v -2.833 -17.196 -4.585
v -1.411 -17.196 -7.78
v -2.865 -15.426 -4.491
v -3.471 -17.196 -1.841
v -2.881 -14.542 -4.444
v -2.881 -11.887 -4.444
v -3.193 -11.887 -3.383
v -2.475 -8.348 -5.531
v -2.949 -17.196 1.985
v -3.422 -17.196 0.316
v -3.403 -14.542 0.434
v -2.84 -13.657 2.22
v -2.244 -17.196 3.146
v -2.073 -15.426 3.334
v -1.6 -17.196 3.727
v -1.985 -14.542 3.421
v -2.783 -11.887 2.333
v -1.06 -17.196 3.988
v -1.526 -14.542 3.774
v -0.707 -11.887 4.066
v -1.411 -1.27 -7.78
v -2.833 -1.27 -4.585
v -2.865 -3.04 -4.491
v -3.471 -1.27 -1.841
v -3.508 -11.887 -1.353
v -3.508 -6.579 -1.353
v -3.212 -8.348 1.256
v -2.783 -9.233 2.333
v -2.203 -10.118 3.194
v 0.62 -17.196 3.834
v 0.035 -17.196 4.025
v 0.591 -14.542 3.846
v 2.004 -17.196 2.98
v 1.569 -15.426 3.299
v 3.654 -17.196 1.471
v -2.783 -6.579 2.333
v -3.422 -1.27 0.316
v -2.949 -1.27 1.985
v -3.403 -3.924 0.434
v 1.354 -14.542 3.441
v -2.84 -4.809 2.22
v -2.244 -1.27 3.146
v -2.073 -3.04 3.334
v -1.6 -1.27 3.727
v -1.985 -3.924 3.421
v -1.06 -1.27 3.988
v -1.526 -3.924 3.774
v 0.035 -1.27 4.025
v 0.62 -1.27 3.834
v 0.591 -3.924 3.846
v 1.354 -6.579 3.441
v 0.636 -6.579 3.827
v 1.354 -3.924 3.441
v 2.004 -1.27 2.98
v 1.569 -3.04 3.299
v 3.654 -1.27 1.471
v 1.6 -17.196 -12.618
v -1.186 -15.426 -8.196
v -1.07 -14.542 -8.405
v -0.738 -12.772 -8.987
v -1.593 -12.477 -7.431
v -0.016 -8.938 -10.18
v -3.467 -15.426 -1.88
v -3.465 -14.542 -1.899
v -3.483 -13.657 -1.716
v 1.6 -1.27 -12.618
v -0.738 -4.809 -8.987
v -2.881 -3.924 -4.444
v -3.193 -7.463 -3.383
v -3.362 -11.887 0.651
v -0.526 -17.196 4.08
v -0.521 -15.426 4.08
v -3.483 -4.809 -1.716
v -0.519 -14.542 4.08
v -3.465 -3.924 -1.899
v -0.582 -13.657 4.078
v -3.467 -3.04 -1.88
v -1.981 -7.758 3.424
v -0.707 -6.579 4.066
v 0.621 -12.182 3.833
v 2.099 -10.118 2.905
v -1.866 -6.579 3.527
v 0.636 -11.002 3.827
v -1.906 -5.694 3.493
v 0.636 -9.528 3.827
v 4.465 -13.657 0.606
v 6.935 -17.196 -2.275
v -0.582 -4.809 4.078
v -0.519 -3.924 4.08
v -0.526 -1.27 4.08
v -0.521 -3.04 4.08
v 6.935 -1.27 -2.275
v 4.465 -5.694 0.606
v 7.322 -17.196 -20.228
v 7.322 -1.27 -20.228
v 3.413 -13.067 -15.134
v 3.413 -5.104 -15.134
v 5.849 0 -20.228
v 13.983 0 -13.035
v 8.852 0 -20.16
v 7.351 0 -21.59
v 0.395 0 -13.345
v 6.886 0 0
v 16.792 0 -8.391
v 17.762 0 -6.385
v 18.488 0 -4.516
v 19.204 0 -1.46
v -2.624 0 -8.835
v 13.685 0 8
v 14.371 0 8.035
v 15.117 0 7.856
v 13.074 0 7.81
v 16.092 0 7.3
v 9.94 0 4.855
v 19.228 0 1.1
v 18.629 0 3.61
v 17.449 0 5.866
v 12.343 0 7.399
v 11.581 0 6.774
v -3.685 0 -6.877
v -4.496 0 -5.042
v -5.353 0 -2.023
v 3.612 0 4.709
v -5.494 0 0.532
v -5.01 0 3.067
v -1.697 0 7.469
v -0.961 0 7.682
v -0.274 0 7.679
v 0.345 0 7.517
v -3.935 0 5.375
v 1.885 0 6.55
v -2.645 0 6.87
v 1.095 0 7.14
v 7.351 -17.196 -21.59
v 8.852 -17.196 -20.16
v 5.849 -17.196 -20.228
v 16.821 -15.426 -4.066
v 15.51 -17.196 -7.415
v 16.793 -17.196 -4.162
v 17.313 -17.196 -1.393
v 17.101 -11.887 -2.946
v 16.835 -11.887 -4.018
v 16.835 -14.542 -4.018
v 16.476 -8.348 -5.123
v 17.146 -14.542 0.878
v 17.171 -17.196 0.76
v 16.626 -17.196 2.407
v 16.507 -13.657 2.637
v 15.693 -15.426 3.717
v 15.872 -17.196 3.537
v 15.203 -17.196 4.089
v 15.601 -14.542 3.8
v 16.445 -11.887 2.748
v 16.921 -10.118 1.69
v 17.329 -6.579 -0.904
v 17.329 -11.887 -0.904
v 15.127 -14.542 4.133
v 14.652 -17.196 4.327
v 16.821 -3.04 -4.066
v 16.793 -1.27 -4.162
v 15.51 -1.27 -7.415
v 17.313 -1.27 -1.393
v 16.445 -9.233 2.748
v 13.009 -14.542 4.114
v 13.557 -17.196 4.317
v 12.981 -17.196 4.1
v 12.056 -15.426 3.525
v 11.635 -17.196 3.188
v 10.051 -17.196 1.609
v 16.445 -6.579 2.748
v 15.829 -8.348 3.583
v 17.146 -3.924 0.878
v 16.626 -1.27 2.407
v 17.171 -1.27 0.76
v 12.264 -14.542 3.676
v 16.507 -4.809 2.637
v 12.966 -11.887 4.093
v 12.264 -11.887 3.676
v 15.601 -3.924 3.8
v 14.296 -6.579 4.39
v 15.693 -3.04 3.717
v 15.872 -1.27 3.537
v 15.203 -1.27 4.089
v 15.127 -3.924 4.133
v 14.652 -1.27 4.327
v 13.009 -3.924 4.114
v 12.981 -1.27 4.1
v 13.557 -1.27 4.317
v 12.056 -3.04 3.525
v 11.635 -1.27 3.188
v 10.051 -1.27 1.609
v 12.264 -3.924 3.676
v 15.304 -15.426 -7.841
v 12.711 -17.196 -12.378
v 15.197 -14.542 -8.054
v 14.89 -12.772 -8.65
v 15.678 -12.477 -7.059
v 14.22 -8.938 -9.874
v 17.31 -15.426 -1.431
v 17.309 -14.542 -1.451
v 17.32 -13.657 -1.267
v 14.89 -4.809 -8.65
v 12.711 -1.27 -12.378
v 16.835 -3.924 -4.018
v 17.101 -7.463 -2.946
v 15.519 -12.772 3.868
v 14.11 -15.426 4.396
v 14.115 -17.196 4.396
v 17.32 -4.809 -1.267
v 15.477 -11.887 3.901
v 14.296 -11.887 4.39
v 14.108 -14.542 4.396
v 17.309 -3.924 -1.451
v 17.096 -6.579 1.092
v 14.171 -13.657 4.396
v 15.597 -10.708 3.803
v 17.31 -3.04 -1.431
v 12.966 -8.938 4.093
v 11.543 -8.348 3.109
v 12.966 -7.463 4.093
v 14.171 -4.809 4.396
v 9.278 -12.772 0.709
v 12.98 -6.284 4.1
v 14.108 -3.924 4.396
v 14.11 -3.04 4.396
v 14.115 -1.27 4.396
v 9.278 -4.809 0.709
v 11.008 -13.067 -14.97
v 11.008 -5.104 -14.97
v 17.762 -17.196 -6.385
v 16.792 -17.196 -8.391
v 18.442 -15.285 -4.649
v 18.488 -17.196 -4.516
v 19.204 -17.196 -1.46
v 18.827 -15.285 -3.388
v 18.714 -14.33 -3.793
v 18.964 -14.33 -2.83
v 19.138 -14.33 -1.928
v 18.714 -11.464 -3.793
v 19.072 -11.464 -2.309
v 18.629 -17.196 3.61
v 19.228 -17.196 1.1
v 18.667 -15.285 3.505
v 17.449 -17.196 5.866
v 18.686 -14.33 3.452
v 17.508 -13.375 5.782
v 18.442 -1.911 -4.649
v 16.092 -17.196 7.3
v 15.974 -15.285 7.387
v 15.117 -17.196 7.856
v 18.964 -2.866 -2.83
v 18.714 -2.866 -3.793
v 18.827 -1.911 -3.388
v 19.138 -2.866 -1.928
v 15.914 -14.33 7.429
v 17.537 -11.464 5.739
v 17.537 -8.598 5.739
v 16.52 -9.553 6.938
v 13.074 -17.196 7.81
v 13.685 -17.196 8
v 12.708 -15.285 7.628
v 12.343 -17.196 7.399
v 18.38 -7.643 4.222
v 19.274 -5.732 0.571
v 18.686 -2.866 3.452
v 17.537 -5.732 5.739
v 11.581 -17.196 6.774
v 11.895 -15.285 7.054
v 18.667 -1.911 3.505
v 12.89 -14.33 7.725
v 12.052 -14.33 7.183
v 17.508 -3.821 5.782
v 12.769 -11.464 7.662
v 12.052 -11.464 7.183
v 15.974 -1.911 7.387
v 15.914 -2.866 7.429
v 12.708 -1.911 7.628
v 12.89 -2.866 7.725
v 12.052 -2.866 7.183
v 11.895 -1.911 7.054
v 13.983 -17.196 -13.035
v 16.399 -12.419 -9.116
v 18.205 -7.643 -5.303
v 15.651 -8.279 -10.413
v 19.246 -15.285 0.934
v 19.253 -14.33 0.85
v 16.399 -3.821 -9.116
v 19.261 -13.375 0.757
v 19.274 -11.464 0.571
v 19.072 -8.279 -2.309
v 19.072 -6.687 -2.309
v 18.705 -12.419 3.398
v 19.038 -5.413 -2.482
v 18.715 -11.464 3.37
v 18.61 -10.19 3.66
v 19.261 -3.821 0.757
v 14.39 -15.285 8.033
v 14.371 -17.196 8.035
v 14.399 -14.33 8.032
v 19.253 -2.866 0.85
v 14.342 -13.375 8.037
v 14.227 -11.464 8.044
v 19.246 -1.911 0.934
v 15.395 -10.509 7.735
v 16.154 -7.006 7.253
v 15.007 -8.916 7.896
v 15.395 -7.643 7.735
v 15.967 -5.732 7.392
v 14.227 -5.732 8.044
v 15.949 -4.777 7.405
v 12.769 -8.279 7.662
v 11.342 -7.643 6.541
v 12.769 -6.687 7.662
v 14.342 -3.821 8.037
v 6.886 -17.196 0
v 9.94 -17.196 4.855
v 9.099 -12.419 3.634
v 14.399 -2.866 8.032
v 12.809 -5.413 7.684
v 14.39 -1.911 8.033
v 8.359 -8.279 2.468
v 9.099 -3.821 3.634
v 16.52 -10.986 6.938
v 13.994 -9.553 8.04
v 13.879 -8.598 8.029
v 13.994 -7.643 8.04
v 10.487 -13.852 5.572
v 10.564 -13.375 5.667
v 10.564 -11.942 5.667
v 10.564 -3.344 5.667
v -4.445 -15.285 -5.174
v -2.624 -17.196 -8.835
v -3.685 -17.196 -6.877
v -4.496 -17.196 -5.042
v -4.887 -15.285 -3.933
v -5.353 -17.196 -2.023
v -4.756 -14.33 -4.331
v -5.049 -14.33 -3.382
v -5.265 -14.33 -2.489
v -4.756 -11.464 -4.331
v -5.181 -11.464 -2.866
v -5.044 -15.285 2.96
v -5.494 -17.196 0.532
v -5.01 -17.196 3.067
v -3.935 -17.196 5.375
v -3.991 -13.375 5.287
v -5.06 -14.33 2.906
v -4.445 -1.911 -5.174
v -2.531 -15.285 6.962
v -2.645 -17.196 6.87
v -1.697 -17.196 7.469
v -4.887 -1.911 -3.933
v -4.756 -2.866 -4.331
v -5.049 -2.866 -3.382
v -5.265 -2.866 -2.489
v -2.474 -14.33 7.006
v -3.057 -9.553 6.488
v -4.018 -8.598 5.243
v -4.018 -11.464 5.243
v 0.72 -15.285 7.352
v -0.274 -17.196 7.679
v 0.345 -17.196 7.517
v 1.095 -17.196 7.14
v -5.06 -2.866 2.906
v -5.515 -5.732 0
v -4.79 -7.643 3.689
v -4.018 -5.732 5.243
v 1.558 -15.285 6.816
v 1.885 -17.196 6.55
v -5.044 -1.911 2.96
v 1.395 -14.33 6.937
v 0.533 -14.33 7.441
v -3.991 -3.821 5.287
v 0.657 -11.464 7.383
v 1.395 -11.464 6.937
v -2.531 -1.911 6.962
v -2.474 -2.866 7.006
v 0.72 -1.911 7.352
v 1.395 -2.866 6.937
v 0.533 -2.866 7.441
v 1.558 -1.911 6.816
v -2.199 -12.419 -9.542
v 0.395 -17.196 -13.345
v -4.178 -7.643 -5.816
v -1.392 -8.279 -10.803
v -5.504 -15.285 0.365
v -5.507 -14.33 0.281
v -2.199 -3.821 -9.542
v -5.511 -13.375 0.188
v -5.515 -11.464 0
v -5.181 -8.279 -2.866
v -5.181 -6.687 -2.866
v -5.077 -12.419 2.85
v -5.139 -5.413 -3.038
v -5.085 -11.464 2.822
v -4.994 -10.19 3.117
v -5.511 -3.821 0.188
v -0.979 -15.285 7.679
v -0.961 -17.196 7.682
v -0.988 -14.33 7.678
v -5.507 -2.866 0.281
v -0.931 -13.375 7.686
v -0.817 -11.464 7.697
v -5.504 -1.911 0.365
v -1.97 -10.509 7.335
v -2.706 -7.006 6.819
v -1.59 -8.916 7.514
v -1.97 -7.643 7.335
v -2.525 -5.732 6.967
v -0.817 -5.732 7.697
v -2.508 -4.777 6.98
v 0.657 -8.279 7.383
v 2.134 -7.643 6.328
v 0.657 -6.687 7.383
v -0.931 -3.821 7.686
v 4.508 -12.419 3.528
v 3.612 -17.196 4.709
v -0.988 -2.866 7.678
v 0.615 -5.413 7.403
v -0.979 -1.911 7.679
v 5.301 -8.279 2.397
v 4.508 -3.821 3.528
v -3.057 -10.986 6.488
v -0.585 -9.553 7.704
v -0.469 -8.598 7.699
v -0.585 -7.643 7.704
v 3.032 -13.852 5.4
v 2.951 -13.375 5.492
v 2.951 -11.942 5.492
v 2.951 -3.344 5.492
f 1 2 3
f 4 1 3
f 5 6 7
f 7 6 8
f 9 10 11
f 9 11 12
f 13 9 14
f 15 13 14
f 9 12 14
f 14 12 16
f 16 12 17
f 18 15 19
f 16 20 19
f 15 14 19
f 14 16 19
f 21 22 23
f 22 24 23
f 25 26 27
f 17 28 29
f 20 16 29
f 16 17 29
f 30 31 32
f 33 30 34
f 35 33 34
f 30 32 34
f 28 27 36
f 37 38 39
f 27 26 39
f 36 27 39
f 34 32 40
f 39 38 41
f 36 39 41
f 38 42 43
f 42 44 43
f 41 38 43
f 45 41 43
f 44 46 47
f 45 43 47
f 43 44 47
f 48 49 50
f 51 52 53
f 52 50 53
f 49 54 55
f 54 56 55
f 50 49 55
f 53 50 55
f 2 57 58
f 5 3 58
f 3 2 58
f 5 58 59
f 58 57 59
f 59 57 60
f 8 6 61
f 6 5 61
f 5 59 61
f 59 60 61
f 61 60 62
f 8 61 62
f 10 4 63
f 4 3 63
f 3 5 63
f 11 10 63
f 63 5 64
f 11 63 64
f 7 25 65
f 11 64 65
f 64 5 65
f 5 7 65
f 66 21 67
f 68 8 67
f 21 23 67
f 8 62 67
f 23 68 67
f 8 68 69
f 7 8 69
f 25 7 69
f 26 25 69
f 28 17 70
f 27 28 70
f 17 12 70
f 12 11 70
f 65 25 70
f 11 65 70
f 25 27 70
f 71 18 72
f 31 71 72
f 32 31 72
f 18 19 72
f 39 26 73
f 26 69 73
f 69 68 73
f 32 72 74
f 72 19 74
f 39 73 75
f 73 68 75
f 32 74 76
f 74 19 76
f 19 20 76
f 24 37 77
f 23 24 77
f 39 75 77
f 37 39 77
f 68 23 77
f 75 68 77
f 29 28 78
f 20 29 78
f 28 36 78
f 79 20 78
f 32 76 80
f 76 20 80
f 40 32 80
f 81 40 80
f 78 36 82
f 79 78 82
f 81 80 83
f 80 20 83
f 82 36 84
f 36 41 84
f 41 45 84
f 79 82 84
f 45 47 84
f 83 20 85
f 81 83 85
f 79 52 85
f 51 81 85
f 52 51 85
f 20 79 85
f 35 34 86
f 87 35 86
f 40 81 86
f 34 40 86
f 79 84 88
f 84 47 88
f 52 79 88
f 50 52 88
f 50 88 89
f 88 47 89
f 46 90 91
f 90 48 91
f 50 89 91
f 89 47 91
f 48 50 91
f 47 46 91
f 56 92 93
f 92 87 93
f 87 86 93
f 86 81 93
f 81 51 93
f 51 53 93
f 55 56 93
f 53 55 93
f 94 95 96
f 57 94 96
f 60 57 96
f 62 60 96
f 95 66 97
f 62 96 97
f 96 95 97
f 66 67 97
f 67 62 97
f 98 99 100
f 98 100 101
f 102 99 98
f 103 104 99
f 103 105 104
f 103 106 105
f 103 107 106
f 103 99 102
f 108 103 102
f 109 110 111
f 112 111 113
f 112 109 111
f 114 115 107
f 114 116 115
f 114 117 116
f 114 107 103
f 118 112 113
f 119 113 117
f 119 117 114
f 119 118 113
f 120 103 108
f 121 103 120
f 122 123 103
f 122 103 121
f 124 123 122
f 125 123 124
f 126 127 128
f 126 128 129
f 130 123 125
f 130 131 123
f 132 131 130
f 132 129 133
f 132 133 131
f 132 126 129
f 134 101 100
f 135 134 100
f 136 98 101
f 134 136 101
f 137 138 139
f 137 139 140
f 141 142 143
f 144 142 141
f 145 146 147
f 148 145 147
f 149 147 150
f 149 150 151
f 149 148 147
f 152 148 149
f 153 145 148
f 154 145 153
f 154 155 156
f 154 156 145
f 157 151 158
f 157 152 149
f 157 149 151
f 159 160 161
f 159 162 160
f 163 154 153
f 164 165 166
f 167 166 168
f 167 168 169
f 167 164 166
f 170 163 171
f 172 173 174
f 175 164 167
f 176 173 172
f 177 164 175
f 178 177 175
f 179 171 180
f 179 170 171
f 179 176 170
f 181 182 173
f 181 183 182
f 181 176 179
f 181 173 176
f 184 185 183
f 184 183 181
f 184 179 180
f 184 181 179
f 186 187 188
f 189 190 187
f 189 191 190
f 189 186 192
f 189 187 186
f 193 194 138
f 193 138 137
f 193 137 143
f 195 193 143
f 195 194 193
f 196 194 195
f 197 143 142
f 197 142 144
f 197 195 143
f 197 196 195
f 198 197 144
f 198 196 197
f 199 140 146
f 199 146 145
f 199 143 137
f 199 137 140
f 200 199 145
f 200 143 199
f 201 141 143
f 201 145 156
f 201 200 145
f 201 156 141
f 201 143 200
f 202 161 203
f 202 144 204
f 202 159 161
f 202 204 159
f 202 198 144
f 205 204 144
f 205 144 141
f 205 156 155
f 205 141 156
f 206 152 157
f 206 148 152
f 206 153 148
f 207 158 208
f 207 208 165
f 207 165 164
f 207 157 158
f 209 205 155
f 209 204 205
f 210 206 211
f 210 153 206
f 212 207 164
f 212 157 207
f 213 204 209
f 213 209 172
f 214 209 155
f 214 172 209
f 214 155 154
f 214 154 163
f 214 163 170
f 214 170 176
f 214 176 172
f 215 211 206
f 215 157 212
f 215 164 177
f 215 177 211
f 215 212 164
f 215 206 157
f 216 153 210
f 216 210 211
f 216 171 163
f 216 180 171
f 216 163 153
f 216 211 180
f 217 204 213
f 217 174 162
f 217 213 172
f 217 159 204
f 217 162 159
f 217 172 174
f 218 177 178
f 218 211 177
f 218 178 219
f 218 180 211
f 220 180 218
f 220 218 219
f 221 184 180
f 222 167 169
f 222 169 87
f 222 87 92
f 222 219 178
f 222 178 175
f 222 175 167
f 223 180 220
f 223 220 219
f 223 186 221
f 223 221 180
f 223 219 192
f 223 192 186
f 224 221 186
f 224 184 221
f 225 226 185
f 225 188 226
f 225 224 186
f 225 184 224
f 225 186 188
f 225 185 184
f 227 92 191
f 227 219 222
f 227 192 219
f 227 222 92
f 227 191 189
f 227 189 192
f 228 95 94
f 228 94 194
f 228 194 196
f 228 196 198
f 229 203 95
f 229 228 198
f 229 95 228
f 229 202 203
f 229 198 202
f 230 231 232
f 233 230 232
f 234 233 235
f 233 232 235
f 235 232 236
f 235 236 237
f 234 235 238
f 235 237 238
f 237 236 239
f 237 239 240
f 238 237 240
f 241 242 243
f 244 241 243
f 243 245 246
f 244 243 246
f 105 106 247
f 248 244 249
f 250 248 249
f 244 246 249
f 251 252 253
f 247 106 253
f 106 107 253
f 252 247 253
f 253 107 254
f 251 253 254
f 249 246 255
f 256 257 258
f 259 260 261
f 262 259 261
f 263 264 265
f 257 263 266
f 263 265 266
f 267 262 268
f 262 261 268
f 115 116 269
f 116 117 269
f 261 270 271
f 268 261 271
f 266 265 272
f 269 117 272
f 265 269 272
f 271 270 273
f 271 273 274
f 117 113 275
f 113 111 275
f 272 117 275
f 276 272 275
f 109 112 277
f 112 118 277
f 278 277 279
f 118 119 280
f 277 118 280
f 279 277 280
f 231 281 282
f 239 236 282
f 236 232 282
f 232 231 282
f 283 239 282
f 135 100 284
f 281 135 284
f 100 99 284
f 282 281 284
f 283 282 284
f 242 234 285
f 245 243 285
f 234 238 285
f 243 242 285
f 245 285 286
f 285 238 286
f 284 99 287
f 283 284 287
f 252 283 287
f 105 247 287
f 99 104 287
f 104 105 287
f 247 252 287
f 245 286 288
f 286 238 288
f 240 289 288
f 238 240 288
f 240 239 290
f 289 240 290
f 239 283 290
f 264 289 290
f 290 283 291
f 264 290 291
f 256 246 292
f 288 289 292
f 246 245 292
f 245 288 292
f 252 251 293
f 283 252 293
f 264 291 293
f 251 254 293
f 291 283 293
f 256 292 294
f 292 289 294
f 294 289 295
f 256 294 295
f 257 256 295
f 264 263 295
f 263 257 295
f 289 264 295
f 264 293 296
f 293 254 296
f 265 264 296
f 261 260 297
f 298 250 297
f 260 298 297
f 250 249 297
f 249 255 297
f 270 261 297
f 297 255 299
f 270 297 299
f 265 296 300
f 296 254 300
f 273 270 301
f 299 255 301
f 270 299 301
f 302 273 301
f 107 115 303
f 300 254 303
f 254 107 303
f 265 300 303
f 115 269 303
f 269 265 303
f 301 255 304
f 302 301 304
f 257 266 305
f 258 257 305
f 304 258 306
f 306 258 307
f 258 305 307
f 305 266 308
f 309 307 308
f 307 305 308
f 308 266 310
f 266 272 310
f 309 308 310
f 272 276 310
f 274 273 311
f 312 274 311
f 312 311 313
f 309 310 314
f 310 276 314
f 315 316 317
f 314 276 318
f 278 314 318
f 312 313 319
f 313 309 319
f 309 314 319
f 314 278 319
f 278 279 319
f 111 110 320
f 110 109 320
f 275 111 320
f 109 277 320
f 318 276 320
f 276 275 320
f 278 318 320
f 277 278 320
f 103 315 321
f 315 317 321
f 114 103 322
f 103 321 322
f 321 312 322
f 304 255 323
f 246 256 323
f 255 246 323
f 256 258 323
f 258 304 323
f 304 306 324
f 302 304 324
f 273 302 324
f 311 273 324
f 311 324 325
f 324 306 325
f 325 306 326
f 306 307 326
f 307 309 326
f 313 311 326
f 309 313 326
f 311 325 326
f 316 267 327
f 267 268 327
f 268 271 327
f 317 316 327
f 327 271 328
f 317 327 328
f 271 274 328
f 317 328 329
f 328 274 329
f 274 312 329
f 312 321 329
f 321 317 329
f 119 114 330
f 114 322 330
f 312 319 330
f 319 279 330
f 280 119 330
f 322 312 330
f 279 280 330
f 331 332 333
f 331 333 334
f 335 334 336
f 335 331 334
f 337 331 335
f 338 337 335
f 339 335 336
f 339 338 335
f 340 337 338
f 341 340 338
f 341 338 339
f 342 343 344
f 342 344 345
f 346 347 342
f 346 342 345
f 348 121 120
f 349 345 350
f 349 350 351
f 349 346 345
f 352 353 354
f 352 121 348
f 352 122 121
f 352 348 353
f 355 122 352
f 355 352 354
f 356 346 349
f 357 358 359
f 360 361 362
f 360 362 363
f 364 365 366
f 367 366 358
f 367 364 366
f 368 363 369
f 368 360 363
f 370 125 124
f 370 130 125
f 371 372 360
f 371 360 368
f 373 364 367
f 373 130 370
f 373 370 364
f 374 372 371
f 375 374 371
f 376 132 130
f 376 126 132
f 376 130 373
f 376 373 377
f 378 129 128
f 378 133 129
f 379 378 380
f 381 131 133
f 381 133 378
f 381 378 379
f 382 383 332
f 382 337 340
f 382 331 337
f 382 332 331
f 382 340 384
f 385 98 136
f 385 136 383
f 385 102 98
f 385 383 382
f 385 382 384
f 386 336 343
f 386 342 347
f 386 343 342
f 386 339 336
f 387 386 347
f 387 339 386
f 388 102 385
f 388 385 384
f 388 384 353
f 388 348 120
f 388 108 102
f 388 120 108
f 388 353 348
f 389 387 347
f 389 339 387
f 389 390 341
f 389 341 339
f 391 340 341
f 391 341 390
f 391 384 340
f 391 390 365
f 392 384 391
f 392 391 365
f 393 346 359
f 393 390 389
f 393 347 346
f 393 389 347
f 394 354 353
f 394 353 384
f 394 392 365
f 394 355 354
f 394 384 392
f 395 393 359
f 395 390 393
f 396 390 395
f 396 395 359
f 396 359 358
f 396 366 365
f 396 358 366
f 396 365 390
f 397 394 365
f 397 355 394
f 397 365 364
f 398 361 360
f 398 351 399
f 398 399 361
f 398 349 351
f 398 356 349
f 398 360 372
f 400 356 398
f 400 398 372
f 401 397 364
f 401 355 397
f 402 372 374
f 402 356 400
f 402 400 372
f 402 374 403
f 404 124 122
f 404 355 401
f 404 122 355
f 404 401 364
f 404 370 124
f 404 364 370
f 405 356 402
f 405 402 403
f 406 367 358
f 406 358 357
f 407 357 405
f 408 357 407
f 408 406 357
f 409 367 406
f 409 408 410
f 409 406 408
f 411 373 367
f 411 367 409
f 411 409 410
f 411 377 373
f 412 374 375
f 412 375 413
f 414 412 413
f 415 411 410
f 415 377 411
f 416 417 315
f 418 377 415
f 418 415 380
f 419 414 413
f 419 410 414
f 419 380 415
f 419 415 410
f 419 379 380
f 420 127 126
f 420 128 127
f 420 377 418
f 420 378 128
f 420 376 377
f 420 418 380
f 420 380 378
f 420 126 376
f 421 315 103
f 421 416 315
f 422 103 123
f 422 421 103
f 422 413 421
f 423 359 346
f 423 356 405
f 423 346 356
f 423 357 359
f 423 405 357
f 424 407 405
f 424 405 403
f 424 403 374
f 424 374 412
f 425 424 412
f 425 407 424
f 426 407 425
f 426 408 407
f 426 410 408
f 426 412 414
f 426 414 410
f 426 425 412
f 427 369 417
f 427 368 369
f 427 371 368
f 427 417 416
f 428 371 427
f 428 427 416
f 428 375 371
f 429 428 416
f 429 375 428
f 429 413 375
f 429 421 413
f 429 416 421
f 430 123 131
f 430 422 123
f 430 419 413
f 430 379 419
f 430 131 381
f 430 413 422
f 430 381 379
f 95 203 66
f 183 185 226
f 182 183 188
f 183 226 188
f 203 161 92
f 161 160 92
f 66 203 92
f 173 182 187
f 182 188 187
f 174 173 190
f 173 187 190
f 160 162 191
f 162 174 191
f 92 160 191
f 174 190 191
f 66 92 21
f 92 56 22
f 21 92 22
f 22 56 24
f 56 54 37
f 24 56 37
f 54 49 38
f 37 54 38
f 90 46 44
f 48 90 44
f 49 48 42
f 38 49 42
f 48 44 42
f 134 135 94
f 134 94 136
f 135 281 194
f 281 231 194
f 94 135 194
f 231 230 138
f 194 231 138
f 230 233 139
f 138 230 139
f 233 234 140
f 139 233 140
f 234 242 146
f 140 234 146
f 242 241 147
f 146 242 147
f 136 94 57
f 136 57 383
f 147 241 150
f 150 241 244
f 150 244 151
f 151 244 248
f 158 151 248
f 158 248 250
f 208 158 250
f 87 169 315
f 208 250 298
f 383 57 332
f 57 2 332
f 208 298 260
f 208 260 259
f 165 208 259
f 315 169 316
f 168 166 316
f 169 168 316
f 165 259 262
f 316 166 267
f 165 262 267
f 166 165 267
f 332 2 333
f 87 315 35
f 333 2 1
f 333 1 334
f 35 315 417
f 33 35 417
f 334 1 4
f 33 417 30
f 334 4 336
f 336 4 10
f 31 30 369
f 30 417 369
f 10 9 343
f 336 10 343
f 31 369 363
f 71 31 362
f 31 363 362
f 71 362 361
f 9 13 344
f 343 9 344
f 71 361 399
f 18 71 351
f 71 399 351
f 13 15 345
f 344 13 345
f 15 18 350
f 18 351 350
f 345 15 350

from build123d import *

# Parameters (mm, degrees)
F1_DEPTH = 17.1958
F2_DEPTH = 1.27


with BuildPart() as f1:
    # F0 (on Front) → F1 (new body)
    with BuildSketch(Plane.XZ):
        with BuildLine():
            add(Edge.make_bspline(
                [(5.8491540482, -20.2276108934), (0.1227568398, -13.2410970002), (-9.1738412765, -1.900316122), (-0.6004910975, 11.4896106569), (4.3132264916, 3.9483505847), (6.8859223132, 0)],
                knots=[0, 0, 0, 0, 0.4331754213, 0.7032330515, 1, 1, 1, 1], degree=3))
            Line((5.8491540482, -20.2276108934), (7.3514936251, -21.59))
            Line((7.3514936251, -21.59), (8.852242511, -20.1599373597))
            add(Edge.make_bspline(
                [(8.852242511, -20.1599373597), (14.2512406842, -12.9172633067), (23.0160834146, -1.1593598985), (13.8358657709, 11.8218148607), (9.2742198308, 4.0624807123), (6.8859222922, 0)],
                knots=[0, 0, 0, 0, 0.4331820762, 0.7032365357, 1, 1, 1, 1], degree=3))
        make_face()
        with BuildLine():
            add(Edge.make_bspline(
                [(7.3221147996, -20.2276108696), (12.3114805407, -13.2243089546), (19.9426811168, -2.5128068597), (14.2122748207, 7.2427496605), (9.5490929418, 1.144107321), (6.9349746668, -2.2747111406)],
                knots=[0, 0, 0, 0, 0.4535146315, 0.6936475085, 1, 1, 1, 1], degree=3))
            add(Edge.make_bspline(
                [(7.3221147907, -20.2276108934), (2.0354861687, -13.4459026934), (-6.0503759454, -3.0733266445), (-0.7458428402, 6.9201896348), (4.1759067343, 1.028238817), (6.9349746445, -2.2747111167)],
                knots=[0, 0, 0, 0, 0.4535146318, 0.6936475087, 1, 1, 1, 1], degree=3))
        make_face(mode=Mode.SUBTRACT)
    extrude(amount=F1_DEPTH)

    # F0 (on Front) → F2 (join)
    with BuildSketch(Plane.XZ):
        with BuildLine():
            add(Edge.make_bspline(
                [(7.3221147907, -20.2276108934), (2.0354861687, -13.4459026934), (-6.0503759454, -3.0733266445), (-0.7458428402, 6.9201896348), (4.1759067343, 1.028238817), (6.9349746445, -2.2747111167)],
                knots=[0, 0, 0, 0, 0.4535146318, 0.6936475087, 1, 1, 1, 1], degree=3))
            add(Edge.make_bspline(
                [(7.3221147996, -20.2276108696), (12.3114805407, -13.2243089546), (19.9426811168, -2.5128068597), (14.2122748207, 7.2427496605), (9.5490929418, 1.144107321), (6.9349746668, -2.2747111406)],
                knots=[0, 0, 0, 0, 0.4535146315, 0.6936475085, 1, 1, 1, 1], degree=3))
        make_face()
    extrude(amount=F2_DEPTH)


solid = f1.part
